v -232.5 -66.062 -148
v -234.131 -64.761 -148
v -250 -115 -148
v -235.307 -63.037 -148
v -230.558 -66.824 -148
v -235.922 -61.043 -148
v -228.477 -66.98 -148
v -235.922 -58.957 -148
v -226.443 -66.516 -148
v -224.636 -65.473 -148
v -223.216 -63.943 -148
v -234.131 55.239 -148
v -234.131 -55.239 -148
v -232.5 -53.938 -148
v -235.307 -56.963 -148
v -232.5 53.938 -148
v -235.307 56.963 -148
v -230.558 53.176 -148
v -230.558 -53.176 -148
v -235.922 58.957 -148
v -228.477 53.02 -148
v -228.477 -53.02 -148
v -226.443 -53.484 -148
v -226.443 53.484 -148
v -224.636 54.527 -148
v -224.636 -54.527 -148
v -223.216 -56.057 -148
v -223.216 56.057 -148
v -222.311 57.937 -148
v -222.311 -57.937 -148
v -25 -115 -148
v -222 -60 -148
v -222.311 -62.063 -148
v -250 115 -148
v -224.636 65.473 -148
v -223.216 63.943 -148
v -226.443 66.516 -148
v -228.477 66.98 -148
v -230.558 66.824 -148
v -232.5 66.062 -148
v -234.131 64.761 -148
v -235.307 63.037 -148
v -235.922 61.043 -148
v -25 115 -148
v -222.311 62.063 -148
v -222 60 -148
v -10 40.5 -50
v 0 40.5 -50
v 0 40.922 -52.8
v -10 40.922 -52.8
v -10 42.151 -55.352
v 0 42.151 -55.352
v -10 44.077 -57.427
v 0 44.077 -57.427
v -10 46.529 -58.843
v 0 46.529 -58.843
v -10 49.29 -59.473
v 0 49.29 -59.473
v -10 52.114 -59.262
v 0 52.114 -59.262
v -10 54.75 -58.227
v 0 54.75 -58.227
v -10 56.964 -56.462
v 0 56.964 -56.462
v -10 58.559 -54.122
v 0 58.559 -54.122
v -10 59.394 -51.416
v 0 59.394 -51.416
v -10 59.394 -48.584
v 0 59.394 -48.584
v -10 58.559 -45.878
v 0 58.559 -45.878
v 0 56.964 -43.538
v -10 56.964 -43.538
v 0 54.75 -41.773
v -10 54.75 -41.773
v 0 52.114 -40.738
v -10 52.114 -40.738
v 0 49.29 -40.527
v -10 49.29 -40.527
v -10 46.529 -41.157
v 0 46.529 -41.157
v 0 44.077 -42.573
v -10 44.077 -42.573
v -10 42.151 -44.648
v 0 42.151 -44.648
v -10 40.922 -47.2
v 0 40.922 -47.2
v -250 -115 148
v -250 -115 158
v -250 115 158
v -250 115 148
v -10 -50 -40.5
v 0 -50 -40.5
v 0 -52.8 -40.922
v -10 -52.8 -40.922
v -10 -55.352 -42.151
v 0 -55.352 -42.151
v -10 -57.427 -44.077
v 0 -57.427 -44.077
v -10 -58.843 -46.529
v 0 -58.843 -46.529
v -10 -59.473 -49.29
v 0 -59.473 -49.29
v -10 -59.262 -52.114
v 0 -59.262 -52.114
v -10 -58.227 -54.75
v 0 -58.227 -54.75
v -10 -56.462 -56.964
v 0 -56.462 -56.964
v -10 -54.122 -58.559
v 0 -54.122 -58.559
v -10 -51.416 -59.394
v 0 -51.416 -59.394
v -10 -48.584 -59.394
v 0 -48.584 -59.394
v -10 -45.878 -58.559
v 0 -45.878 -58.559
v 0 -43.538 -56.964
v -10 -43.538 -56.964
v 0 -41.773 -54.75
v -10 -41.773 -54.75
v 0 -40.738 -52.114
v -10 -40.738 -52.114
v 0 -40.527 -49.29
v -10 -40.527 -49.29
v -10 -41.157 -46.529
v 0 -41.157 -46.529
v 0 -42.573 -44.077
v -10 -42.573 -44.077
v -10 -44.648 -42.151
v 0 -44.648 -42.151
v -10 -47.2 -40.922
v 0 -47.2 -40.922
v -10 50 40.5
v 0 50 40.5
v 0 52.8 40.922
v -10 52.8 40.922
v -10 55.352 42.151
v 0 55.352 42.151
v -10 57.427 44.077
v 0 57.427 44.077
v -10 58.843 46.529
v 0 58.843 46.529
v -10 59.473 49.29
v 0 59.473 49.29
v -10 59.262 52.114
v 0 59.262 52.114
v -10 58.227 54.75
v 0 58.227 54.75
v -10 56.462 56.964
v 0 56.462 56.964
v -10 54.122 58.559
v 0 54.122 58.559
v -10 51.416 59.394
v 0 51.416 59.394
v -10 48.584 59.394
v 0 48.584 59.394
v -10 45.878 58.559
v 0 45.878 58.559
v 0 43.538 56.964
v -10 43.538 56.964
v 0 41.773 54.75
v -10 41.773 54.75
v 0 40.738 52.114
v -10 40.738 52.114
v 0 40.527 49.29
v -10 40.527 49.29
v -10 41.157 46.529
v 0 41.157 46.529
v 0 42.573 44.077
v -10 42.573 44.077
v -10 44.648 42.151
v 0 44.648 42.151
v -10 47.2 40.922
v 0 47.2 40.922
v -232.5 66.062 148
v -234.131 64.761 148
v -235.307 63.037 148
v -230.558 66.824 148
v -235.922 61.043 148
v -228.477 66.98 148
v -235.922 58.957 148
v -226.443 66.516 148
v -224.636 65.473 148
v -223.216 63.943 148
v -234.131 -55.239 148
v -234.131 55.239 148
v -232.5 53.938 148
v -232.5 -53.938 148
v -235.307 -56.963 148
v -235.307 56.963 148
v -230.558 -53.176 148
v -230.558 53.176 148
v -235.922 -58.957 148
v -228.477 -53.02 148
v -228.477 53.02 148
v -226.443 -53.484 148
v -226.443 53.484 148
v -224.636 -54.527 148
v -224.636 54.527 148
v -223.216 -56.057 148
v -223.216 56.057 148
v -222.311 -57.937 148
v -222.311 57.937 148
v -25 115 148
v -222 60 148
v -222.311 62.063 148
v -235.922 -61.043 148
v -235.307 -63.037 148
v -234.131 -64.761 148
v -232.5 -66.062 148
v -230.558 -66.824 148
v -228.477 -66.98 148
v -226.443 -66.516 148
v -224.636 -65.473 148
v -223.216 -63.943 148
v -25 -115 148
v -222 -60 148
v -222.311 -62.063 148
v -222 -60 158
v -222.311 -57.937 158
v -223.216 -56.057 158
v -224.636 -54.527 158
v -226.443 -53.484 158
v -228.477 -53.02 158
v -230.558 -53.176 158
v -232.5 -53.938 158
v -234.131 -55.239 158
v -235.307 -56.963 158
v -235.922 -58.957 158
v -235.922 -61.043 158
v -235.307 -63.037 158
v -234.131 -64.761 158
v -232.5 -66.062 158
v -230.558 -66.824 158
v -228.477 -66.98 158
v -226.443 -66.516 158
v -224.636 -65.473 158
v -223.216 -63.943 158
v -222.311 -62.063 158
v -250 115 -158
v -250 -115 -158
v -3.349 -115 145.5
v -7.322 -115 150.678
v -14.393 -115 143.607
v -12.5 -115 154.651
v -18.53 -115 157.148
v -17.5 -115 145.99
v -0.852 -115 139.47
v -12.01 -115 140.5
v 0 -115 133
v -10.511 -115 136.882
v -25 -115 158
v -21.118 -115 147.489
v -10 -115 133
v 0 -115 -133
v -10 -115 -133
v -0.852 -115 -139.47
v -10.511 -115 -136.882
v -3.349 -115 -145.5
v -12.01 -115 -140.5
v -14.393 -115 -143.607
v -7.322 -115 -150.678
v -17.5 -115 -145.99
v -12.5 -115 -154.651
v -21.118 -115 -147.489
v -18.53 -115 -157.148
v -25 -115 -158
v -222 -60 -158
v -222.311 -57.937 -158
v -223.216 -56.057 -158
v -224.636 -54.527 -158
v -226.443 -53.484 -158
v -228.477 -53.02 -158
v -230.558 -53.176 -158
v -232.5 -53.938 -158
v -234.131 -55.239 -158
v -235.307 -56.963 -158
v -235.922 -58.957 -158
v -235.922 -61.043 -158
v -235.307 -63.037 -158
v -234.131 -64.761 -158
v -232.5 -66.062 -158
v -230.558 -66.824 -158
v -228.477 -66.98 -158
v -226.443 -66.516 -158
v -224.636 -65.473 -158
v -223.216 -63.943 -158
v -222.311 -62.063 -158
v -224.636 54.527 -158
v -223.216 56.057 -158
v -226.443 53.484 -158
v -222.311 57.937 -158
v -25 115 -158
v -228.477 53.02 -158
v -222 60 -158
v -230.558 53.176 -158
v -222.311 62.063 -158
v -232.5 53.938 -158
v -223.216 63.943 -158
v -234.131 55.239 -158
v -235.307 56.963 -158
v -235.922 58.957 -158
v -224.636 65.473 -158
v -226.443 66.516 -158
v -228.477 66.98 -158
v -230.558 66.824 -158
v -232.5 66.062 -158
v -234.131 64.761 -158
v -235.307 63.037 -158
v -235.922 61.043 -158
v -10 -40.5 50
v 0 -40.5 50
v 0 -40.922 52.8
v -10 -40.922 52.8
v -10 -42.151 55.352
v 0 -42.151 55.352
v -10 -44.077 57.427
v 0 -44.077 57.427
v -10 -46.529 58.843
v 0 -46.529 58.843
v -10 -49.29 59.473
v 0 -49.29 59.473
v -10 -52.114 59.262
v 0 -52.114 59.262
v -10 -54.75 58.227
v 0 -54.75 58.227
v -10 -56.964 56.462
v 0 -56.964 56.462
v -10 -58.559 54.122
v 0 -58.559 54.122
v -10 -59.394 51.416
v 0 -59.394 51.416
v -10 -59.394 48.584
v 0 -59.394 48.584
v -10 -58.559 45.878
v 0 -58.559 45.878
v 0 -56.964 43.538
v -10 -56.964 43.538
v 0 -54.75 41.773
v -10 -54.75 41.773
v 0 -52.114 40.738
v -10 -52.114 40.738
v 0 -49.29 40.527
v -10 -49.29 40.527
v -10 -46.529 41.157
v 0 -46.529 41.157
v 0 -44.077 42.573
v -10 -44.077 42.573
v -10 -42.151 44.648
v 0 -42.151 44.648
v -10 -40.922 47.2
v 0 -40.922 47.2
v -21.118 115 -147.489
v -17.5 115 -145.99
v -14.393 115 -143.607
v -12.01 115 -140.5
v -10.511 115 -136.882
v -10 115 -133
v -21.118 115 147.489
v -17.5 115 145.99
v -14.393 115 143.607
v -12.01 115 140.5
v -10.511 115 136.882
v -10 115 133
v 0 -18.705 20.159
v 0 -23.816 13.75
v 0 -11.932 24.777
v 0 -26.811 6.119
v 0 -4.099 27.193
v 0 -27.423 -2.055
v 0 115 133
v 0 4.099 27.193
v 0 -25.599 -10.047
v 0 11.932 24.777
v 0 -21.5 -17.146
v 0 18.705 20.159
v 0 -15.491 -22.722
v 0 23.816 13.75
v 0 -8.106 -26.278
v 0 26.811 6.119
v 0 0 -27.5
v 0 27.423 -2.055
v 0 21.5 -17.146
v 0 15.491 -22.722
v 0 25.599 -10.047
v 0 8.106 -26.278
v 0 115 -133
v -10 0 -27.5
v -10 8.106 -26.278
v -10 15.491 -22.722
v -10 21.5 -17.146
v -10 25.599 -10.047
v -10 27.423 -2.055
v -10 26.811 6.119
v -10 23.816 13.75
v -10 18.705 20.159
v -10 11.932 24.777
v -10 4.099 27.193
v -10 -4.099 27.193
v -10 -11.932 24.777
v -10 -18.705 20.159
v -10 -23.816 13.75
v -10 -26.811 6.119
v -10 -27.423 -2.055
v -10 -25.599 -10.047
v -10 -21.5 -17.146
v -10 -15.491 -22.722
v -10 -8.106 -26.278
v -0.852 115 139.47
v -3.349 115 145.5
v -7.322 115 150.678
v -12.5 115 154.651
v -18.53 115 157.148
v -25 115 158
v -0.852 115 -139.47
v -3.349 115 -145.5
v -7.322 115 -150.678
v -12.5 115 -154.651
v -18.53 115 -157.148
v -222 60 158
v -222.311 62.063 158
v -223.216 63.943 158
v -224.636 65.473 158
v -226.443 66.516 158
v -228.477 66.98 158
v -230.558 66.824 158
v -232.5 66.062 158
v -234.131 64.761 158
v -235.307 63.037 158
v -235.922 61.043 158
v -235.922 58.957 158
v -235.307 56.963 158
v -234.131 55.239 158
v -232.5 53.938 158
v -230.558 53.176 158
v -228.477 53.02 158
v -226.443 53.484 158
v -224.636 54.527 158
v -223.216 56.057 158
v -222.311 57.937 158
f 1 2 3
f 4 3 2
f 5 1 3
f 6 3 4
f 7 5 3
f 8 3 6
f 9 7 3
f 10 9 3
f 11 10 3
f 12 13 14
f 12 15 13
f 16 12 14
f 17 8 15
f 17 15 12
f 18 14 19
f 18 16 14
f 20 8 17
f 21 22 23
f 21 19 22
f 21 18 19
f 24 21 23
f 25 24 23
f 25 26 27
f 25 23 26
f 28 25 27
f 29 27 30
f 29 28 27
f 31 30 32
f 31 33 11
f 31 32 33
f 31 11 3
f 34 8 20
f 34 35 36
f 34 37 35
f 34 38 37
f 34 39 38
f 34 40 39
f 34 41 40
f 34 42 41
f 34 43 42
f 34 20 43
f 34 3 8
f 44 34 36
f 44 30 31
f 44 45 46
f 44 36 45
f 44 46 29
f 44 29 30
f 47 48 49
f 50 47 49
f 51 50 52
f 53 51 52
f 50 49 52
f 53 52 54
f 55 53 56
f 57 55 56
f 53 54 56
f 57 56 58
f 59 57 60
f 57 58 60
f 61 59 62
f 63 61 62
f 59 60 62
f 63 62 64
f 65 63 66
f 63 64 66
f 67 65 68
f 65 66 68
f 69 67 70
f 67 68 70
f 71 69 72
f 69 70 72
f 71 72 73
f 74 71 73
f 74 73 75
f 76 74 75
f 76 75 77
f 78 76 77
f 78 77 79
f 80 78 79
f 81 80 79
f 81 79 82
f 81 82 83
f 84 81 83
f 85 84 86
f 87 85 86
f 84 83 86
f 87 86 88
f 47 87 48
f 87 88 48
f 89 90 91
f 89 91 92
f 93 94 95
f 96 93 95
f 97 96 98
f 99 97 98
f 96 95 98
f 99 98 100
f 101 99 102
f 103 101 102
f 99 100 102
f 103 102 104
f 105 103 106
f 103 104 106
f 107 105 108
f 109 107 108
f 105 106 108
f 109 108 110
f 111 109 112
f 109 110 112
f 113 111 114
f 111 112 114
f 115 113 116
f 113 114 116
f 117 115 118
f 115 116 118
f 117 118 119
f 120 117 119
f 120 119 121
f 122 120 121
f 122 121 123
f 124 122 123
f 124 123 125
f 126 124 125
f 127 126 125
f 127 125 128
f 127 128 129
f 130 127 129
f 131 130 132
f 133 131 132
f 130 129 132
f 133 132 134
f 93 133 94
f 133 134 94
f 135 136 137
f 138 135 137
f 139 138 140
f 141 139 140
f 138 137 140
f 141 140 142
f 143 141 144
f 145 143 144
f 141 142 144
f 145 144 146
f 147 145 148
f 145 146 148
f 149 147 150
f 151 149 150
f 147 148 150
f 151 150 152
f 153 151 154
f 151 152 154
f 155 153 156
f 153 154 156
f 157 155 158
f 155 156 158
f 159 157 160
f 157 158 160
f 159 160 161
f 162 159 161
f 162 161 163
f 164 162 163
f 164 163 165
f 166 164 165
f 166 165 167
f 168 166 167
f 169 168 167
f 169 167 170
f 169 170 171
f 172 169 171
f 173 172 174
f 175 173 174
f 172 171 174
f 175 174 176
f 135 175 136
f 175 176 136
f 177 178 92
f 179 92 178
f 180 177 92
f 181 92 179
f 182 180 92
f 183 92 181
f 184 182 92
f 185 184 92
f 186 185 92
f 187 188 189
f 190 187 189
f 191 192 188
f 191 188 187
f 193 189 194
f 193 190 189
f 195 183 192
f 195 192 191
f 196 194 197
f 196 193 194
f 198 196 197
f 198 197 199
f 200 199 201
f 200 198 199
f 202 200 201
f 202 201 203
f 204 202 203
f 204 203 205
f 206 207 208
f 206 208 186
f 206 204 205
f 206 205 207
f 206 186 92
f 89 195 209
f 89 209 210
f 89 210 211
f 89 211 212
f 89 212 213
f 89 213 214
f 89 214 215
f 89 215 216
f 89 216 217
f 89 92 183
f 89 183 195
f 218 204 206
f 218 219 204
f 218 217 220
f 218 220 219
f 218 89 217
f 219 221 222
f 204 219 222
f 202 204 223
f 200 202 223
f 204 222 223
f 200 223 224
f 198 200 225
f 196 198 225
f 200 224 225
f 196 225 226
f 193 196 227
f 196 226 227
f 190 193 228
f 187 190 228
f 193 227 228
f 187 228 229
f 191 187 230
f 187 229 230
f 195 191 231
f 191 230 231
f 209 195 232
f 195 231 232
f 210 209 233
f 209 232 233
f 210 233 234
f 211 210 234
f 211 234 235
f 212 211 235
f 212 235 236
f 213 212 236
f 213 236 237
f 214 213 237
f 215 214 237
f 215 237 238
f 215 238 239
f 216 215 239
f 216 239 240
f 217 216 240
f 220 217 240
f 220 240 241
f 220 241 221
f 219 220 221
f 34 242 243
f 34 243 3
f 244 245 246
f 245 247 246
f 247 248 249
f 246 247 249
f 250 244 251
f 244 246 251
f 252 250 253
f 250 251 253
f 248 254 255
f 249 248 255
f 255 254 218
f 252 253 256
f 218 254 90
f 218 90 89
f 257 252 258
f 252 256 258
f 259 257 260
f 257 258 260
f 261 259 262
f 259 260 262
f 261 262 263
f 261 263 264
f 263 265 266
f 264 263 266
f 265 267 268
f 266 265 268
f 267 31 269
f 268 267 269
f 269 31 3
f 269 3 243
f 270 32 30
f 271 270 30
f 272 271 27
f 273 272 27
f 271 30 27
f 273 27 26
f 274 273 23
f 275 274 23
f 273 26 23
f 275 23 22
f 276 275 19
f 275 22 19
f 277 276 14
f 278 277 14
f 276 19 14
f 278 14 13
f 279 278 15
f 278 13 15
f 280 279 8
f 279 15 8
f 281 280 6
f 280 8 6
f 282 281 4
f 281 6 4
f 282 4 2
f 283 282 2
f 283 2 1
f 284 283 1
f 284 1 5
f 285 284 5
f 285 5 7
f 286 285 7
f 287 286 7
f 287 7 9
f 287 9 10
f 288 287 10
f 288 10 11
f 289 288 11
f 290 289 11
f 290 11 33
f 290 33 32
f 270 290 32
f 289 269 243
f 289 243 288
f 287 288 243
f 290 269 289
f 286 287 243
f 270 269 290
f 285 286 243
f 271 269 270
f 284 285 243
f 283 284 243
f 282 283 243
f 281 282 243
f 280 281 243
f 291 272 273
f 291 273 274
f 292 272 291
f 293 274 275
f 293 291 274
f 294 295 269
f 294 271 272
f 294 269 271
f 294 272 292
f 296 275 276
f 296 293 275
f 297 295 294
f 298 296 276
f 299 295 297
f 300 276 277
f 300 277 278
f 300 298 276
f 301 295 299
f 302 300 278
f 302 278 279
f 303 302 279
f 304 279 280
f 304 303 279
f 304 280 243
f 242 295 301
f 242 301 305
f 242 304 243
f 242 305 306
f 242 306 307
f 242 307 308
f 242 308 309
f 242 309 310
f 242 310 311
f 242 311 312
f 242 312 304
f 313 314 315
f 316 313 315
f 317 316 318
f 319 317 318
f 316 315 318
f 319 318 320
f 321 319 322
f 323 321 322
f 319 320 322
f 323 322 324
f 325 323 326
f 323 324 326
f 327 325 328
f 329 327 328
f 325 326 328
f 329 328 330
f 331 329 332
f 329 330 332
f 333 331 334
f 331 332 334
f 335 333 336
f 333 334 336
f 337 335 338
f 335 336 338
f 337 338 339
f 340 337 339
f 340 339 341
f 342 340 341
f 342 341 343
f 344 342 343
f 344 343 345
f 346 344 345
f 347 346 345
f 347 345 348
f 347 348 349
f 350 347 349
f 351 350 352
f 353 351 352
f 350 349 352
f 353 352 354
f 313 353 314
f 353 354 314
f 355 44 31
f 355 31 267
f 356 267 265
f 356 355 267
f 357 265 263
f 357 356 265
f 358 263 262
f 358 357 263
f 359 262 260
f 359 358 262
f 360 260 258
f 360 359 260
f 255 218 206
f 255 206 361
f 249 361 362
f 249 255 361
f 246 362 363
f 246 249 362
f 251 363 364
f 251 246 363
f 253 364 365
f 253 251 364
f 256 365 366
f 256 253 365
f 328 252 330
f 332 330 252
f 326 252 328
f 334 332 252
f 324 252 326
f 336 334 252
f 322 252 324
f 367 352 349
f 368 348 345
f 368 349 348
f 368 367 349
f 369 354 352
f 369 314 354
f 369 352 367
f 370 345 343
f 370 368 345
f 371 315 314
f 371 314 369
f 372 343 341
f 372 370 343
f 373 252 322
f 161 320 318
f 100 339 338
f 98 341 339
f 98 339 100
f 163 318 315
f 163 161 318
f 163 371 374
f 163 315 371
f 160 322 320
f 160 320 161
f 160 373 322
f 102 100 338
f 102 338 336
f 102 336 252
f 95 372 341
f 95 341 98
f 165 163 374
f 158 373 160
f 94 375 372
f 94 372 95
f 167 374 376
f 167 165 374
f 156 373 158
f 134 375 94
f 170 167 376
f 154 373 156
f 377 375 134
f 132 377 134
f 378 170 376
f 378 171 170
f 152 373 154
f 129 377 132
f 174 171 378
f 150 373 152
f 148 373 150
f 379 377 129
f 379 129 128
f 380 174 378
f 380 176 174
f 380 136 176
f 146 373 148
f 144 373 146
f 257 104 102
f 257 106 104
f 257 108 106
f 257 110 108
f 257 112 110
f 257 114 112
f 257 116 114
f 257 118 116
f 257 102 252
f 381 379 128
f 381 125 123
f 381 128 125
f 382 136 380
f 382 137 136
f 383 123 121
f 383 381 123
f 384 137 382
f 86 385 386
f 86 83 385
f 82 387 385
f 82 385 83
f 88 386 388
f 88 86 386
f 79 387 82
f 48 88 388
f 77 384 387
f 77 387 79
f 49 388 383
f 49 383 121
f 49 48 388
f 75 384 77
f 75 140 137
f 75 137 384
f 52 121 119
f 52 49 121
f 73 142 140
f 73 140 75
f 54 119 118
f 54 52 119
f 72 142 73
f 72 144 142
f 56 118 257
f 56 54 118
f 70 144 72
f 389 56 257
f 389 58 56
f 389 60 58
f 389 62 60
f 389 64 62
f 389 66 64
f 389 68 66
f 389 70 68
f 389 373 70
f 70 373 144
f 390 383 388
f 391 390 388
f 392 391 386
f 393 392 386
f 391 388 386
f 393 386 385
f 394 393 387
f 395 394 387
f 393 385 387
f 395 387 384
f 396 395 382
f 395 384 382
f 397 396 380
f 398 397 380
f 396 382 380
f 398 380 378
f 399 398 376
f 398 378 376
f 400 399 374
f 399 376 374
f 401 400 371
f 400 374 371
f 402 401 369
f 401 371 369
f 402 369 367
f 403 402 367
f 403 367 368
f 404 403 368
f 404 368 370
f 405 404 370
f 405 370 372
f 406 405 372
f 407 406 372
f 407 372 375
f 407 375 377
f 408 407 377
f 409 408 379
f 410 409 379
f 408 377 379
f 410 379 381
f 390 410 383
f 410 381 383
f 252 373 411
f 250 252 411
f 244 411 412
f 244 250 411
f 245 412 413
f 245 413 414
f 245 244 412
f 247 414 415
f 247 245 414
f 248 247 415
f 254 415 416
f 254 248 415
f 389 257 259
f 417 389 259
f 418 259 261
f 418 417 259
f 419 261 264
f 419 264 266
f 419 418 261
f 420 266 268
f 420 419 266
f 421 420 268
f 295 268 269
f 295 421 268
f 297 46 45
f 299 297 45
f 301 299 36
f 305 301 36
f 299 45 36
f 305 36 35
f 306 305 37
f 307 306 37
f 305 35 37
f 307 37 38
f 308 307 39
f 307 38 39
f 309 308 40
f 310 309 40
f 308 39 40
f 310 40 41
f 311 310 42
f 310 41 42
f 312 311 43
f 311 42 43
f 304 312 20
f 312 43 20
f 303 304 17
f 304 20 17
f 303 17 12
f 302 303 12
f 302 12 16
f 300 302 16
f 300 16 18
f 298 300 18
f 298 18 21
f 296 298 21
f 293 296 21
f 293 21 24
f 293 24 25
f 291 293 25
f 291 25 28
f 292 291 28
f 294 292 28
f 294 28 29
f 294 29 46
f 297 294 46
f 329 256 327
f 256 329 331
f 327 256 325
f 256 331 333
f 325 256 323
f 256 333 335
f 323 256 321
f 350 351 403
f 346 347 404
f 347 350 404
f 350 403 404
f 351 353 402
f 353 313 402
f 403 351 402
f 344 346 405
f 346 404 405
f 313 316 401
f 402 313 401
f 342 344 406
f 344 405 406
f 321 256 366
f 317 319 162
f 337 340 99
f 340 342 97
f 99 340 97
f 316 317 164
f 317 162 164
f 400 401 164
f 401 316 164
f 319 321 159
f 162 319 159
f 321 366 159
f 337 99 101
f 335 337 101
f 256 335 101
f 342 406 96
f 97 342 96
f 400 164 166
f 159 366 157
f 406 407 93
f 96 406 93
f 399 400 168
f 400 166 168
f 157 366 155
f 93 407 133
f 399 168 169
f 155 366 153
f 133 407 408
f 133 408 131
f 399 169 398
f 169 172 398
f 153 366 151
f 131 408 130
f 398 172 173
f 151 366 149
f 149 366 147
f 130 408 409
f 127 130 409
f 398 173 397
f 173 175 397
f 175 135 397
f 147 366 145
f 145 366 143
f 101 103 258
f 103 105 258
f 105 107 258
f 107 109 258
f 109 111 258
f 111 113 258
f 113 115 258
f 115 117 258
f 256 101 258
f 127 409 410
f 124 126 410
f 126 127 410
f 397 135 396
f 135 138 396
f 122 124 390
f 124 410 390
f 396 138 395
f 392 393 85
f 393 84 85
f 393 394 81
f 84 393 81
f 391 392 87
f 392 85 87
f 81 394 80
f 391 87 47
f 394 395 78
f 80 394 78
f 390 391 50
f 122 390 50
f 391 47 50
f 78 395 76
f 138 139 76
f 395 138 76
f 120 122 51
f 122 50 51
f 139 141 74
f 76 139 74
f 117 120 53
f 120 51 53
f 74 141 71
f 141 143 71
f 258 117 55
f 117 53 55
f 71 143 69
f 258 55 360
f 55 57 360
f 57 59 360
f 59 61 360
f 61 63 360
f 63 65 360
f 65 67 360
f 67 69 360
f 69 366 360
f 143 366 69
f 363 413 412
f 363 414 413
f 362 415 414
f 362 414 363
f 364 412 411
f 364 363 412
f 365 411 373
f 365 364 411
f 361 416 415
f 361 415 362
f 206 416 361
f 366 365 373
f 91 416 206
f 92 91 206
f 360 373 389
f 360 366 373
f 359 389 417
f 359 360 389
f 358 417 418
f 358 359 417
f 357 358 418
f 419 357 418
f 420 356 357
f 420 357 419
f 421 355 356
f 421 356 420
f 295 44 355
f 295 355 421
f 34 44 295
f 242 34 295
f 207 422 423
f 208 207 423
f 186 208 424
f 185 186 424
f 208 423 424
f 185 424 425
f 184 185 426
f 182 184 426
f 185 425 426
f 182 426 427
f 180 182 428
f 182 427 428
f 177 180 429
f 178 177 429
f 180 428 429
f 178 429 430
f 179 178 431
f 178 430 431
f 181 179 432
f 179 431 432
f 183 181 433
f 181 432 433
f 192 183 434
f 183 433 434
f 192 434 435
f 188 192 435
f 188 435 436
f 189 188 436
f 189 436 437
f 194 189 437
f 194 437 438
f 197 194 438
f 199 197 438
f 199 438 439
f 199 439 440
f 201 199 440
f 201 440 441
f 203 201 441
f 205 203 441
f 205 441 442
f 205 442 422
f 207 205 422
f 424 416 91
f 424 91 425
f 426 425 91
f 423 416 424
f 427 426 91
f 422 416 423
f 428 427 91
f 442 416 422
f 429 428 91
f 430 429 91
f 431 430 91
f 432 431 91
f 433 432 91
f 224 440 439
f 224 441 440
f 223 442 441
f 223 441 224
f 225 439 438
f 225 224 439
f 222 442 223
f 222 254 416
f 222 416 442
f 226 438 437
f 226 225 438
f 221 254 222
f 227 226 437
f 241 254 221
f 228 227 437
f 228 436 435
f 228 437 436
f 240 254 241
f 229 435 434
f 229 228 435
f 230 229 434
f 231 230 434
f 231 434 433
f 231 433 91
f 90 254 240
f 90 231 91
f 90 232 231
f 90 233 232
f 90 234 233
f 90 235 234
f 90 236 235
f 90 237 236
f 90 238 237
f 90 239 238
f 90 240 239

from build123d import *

# Parameters (mm, degrees)
SKETCH1_W                      = 316
SKETCH1_H                      = 230
BASE_FLANGE1_DEPTH             = 10
EDGE_FLANGE1_STRIP_W           = 70
EDGE_FLANGE1_STRIP_H           = 10
EDGE_FLANGE1_STRIP_CUT_DEPTH   = 230
EDGE_FLANGE1_STRIP_2_W         = 70
EDGE_FLANGE1_STRIP_2_H         = 10
EDGE_FLANGE1_STRIP_CUT_2_DEPTH = 230
EDGE_FLANGE1_DEPTH             = 230
EDGE_FLANGE1_BEND_DEPTH        = 230
SKETCH12_R                     = 27.5
CUT_EXTRUDE1_DEPTH             = 10
SKETCH14_R                     = 9.5
CUT_EXTRUDE3_DEPTH             = 10
CIRPATTERN1_COUNT              = 4
SKETCH17_R                     = 7
CUT_EXTRUDE4_DEPTH             = 420.023865669


# Sheet-metal steps are written as plain solids
with BuildPart() as part:
    # Sketch1 → Base-Flange1 (new body)
    with BuildSketch(Plane(origin=(0, 0, 0), x_dir=(0, 0, -1), z_dir=(1, 0, 0))):
        Rectangle(SKETCH1_W, SKETCH1_H)
    extrude(amount=-BASE_FLANGE1_DEPTH)

    # Edge-Flange1 strip (across the edge) → Edge-Flange1 strip cut (cut)
    with BuildSketch(Plane(origin=(-10, -115, 158), x_dir=(0, 0, -1), z_dir=(0, 1, 0))):
        with Locations((-10, -5)):
            Rectangle(EDGE_FLANGE1_STRIP_W, EDGE_FLANGE1_STRIP_H)
    extrude(amount=EDGE_FLANGE1_STRIP_CUT_DEPTH, mode=Mode.SUBTRACT)

    # Edge-Flange1 strip 2 (across the edge) → Edge-Flange1 strip cut 2 (cut)
    with BuildSketch(Plane(origin=(-10, 115, -158), x_dir=(0, 0, 1), z_dir=(0, -1, 0))):
        with Locations((-10, -5)):
            Rectangle(EDGE_FLANGE1_STRIP_2_W, EDGE_FLANGE1_STRIP_2_H)
    extrude(amount=EDGE_FLANGE1_STRIP_CUT_2_DEPTH, mode=Mode.SUBTRACT)

    # Edge-Flange1 section (across the edge) → Edge-Flange1 (add)
    with BuildSketch(Plane(origin=(-10, -115, 158), x_dir=(0, 0, -1), z_dir=(0, 1, 0))):
        with BuildLine():
            Line((0, 15), (0, 240))
            Line((0, 240), (10, 240))
            Line((10, 240), (10, 15))
            ThreePointArc((10, 15), (14.393398282, 4.393398282), (25, 0))
            Line((25, 0), (25, -10))
            ThreePointArc((25, -10), (7.32233047, -2.67766953), (0, 15))
        make_face()
    extrude(amount=EDGE_FLANGE1_DEPTH)

    # Edge-Flange1 section 2 (across the edge) → Edge-Flange1 bend (add)
    with BuildSketch(Plane(origin=(-10, 115, -158), x_dir=(0, 0, 1), z_dir=(0, -1, 0))):
        with BuildLine():
            Line((0, 15), (0, 240))
            Line((0, 240), (10, 240))
            Line((10, 240), (10, 15))
            ThreePointArc((10, 15), (14.393398282, 4.393398282), (25, 0))
            Line((25, 0), (25, -10))
            ThreePointArc((25, -10), (7.32233047, -2.67766953), (0, 15))
        make_face()
    extrude(amount=EDGE_FLANGE1_BEND_DEPTH)

    # Sketch12 → Cut-Extrude1 (cut)
    with BuildSketch(Plane(origin=(0, 0, 0), x_dir=(0, 0, -1), z_dir=(1, 0, 0))):
        Circle(SKETCH12_R)
    extrude(amount=-CUT_EXTRUDE1_DEPTH, mode=Mode.SUBTRACT)

    # Sketch14 → Cut-Extrude3 (cut)
    with BuildSketch(Plane(origin=(0, 0, 0), x_dir=(0, 0, -1), z_dir=(1, 0, 0))):
        with Locations((-50, 50)):
            Circle(SKETCH14_R)
    cut_extrude3 = extrude(amount=-CUT_EXTRUDE3_DEPTH, mode=Mode.SUBTRACT)

    # CirPattern1: Cut-Extrude3 ×4 about axis
    cirpattern1_axis = Axis((0, 0, 0), (1, 0, 0))
    for i in range(1, CIRPATTERN1_COUNT):
        add(cut_extrude3.rotate(cirpattern1_axis, i * 360 / CIRPATTERN1_COUNT), mode=Mode.SUBTRACT)

    # Sketch17 → Cut-Extrude4 (cut, through all)
    with BuildSketch(Plane.XY.offset(158)):
        with Locations((-229, 60)):
            Circle(SKETCH17_R)
        with Locations((-229, -60)):
            Circle(SKETCH17_R)
    extrude(amount=-CUT_EXTRUDE4_DEPTH, mode=Mode.SUBTRACT)


solid = part.part
